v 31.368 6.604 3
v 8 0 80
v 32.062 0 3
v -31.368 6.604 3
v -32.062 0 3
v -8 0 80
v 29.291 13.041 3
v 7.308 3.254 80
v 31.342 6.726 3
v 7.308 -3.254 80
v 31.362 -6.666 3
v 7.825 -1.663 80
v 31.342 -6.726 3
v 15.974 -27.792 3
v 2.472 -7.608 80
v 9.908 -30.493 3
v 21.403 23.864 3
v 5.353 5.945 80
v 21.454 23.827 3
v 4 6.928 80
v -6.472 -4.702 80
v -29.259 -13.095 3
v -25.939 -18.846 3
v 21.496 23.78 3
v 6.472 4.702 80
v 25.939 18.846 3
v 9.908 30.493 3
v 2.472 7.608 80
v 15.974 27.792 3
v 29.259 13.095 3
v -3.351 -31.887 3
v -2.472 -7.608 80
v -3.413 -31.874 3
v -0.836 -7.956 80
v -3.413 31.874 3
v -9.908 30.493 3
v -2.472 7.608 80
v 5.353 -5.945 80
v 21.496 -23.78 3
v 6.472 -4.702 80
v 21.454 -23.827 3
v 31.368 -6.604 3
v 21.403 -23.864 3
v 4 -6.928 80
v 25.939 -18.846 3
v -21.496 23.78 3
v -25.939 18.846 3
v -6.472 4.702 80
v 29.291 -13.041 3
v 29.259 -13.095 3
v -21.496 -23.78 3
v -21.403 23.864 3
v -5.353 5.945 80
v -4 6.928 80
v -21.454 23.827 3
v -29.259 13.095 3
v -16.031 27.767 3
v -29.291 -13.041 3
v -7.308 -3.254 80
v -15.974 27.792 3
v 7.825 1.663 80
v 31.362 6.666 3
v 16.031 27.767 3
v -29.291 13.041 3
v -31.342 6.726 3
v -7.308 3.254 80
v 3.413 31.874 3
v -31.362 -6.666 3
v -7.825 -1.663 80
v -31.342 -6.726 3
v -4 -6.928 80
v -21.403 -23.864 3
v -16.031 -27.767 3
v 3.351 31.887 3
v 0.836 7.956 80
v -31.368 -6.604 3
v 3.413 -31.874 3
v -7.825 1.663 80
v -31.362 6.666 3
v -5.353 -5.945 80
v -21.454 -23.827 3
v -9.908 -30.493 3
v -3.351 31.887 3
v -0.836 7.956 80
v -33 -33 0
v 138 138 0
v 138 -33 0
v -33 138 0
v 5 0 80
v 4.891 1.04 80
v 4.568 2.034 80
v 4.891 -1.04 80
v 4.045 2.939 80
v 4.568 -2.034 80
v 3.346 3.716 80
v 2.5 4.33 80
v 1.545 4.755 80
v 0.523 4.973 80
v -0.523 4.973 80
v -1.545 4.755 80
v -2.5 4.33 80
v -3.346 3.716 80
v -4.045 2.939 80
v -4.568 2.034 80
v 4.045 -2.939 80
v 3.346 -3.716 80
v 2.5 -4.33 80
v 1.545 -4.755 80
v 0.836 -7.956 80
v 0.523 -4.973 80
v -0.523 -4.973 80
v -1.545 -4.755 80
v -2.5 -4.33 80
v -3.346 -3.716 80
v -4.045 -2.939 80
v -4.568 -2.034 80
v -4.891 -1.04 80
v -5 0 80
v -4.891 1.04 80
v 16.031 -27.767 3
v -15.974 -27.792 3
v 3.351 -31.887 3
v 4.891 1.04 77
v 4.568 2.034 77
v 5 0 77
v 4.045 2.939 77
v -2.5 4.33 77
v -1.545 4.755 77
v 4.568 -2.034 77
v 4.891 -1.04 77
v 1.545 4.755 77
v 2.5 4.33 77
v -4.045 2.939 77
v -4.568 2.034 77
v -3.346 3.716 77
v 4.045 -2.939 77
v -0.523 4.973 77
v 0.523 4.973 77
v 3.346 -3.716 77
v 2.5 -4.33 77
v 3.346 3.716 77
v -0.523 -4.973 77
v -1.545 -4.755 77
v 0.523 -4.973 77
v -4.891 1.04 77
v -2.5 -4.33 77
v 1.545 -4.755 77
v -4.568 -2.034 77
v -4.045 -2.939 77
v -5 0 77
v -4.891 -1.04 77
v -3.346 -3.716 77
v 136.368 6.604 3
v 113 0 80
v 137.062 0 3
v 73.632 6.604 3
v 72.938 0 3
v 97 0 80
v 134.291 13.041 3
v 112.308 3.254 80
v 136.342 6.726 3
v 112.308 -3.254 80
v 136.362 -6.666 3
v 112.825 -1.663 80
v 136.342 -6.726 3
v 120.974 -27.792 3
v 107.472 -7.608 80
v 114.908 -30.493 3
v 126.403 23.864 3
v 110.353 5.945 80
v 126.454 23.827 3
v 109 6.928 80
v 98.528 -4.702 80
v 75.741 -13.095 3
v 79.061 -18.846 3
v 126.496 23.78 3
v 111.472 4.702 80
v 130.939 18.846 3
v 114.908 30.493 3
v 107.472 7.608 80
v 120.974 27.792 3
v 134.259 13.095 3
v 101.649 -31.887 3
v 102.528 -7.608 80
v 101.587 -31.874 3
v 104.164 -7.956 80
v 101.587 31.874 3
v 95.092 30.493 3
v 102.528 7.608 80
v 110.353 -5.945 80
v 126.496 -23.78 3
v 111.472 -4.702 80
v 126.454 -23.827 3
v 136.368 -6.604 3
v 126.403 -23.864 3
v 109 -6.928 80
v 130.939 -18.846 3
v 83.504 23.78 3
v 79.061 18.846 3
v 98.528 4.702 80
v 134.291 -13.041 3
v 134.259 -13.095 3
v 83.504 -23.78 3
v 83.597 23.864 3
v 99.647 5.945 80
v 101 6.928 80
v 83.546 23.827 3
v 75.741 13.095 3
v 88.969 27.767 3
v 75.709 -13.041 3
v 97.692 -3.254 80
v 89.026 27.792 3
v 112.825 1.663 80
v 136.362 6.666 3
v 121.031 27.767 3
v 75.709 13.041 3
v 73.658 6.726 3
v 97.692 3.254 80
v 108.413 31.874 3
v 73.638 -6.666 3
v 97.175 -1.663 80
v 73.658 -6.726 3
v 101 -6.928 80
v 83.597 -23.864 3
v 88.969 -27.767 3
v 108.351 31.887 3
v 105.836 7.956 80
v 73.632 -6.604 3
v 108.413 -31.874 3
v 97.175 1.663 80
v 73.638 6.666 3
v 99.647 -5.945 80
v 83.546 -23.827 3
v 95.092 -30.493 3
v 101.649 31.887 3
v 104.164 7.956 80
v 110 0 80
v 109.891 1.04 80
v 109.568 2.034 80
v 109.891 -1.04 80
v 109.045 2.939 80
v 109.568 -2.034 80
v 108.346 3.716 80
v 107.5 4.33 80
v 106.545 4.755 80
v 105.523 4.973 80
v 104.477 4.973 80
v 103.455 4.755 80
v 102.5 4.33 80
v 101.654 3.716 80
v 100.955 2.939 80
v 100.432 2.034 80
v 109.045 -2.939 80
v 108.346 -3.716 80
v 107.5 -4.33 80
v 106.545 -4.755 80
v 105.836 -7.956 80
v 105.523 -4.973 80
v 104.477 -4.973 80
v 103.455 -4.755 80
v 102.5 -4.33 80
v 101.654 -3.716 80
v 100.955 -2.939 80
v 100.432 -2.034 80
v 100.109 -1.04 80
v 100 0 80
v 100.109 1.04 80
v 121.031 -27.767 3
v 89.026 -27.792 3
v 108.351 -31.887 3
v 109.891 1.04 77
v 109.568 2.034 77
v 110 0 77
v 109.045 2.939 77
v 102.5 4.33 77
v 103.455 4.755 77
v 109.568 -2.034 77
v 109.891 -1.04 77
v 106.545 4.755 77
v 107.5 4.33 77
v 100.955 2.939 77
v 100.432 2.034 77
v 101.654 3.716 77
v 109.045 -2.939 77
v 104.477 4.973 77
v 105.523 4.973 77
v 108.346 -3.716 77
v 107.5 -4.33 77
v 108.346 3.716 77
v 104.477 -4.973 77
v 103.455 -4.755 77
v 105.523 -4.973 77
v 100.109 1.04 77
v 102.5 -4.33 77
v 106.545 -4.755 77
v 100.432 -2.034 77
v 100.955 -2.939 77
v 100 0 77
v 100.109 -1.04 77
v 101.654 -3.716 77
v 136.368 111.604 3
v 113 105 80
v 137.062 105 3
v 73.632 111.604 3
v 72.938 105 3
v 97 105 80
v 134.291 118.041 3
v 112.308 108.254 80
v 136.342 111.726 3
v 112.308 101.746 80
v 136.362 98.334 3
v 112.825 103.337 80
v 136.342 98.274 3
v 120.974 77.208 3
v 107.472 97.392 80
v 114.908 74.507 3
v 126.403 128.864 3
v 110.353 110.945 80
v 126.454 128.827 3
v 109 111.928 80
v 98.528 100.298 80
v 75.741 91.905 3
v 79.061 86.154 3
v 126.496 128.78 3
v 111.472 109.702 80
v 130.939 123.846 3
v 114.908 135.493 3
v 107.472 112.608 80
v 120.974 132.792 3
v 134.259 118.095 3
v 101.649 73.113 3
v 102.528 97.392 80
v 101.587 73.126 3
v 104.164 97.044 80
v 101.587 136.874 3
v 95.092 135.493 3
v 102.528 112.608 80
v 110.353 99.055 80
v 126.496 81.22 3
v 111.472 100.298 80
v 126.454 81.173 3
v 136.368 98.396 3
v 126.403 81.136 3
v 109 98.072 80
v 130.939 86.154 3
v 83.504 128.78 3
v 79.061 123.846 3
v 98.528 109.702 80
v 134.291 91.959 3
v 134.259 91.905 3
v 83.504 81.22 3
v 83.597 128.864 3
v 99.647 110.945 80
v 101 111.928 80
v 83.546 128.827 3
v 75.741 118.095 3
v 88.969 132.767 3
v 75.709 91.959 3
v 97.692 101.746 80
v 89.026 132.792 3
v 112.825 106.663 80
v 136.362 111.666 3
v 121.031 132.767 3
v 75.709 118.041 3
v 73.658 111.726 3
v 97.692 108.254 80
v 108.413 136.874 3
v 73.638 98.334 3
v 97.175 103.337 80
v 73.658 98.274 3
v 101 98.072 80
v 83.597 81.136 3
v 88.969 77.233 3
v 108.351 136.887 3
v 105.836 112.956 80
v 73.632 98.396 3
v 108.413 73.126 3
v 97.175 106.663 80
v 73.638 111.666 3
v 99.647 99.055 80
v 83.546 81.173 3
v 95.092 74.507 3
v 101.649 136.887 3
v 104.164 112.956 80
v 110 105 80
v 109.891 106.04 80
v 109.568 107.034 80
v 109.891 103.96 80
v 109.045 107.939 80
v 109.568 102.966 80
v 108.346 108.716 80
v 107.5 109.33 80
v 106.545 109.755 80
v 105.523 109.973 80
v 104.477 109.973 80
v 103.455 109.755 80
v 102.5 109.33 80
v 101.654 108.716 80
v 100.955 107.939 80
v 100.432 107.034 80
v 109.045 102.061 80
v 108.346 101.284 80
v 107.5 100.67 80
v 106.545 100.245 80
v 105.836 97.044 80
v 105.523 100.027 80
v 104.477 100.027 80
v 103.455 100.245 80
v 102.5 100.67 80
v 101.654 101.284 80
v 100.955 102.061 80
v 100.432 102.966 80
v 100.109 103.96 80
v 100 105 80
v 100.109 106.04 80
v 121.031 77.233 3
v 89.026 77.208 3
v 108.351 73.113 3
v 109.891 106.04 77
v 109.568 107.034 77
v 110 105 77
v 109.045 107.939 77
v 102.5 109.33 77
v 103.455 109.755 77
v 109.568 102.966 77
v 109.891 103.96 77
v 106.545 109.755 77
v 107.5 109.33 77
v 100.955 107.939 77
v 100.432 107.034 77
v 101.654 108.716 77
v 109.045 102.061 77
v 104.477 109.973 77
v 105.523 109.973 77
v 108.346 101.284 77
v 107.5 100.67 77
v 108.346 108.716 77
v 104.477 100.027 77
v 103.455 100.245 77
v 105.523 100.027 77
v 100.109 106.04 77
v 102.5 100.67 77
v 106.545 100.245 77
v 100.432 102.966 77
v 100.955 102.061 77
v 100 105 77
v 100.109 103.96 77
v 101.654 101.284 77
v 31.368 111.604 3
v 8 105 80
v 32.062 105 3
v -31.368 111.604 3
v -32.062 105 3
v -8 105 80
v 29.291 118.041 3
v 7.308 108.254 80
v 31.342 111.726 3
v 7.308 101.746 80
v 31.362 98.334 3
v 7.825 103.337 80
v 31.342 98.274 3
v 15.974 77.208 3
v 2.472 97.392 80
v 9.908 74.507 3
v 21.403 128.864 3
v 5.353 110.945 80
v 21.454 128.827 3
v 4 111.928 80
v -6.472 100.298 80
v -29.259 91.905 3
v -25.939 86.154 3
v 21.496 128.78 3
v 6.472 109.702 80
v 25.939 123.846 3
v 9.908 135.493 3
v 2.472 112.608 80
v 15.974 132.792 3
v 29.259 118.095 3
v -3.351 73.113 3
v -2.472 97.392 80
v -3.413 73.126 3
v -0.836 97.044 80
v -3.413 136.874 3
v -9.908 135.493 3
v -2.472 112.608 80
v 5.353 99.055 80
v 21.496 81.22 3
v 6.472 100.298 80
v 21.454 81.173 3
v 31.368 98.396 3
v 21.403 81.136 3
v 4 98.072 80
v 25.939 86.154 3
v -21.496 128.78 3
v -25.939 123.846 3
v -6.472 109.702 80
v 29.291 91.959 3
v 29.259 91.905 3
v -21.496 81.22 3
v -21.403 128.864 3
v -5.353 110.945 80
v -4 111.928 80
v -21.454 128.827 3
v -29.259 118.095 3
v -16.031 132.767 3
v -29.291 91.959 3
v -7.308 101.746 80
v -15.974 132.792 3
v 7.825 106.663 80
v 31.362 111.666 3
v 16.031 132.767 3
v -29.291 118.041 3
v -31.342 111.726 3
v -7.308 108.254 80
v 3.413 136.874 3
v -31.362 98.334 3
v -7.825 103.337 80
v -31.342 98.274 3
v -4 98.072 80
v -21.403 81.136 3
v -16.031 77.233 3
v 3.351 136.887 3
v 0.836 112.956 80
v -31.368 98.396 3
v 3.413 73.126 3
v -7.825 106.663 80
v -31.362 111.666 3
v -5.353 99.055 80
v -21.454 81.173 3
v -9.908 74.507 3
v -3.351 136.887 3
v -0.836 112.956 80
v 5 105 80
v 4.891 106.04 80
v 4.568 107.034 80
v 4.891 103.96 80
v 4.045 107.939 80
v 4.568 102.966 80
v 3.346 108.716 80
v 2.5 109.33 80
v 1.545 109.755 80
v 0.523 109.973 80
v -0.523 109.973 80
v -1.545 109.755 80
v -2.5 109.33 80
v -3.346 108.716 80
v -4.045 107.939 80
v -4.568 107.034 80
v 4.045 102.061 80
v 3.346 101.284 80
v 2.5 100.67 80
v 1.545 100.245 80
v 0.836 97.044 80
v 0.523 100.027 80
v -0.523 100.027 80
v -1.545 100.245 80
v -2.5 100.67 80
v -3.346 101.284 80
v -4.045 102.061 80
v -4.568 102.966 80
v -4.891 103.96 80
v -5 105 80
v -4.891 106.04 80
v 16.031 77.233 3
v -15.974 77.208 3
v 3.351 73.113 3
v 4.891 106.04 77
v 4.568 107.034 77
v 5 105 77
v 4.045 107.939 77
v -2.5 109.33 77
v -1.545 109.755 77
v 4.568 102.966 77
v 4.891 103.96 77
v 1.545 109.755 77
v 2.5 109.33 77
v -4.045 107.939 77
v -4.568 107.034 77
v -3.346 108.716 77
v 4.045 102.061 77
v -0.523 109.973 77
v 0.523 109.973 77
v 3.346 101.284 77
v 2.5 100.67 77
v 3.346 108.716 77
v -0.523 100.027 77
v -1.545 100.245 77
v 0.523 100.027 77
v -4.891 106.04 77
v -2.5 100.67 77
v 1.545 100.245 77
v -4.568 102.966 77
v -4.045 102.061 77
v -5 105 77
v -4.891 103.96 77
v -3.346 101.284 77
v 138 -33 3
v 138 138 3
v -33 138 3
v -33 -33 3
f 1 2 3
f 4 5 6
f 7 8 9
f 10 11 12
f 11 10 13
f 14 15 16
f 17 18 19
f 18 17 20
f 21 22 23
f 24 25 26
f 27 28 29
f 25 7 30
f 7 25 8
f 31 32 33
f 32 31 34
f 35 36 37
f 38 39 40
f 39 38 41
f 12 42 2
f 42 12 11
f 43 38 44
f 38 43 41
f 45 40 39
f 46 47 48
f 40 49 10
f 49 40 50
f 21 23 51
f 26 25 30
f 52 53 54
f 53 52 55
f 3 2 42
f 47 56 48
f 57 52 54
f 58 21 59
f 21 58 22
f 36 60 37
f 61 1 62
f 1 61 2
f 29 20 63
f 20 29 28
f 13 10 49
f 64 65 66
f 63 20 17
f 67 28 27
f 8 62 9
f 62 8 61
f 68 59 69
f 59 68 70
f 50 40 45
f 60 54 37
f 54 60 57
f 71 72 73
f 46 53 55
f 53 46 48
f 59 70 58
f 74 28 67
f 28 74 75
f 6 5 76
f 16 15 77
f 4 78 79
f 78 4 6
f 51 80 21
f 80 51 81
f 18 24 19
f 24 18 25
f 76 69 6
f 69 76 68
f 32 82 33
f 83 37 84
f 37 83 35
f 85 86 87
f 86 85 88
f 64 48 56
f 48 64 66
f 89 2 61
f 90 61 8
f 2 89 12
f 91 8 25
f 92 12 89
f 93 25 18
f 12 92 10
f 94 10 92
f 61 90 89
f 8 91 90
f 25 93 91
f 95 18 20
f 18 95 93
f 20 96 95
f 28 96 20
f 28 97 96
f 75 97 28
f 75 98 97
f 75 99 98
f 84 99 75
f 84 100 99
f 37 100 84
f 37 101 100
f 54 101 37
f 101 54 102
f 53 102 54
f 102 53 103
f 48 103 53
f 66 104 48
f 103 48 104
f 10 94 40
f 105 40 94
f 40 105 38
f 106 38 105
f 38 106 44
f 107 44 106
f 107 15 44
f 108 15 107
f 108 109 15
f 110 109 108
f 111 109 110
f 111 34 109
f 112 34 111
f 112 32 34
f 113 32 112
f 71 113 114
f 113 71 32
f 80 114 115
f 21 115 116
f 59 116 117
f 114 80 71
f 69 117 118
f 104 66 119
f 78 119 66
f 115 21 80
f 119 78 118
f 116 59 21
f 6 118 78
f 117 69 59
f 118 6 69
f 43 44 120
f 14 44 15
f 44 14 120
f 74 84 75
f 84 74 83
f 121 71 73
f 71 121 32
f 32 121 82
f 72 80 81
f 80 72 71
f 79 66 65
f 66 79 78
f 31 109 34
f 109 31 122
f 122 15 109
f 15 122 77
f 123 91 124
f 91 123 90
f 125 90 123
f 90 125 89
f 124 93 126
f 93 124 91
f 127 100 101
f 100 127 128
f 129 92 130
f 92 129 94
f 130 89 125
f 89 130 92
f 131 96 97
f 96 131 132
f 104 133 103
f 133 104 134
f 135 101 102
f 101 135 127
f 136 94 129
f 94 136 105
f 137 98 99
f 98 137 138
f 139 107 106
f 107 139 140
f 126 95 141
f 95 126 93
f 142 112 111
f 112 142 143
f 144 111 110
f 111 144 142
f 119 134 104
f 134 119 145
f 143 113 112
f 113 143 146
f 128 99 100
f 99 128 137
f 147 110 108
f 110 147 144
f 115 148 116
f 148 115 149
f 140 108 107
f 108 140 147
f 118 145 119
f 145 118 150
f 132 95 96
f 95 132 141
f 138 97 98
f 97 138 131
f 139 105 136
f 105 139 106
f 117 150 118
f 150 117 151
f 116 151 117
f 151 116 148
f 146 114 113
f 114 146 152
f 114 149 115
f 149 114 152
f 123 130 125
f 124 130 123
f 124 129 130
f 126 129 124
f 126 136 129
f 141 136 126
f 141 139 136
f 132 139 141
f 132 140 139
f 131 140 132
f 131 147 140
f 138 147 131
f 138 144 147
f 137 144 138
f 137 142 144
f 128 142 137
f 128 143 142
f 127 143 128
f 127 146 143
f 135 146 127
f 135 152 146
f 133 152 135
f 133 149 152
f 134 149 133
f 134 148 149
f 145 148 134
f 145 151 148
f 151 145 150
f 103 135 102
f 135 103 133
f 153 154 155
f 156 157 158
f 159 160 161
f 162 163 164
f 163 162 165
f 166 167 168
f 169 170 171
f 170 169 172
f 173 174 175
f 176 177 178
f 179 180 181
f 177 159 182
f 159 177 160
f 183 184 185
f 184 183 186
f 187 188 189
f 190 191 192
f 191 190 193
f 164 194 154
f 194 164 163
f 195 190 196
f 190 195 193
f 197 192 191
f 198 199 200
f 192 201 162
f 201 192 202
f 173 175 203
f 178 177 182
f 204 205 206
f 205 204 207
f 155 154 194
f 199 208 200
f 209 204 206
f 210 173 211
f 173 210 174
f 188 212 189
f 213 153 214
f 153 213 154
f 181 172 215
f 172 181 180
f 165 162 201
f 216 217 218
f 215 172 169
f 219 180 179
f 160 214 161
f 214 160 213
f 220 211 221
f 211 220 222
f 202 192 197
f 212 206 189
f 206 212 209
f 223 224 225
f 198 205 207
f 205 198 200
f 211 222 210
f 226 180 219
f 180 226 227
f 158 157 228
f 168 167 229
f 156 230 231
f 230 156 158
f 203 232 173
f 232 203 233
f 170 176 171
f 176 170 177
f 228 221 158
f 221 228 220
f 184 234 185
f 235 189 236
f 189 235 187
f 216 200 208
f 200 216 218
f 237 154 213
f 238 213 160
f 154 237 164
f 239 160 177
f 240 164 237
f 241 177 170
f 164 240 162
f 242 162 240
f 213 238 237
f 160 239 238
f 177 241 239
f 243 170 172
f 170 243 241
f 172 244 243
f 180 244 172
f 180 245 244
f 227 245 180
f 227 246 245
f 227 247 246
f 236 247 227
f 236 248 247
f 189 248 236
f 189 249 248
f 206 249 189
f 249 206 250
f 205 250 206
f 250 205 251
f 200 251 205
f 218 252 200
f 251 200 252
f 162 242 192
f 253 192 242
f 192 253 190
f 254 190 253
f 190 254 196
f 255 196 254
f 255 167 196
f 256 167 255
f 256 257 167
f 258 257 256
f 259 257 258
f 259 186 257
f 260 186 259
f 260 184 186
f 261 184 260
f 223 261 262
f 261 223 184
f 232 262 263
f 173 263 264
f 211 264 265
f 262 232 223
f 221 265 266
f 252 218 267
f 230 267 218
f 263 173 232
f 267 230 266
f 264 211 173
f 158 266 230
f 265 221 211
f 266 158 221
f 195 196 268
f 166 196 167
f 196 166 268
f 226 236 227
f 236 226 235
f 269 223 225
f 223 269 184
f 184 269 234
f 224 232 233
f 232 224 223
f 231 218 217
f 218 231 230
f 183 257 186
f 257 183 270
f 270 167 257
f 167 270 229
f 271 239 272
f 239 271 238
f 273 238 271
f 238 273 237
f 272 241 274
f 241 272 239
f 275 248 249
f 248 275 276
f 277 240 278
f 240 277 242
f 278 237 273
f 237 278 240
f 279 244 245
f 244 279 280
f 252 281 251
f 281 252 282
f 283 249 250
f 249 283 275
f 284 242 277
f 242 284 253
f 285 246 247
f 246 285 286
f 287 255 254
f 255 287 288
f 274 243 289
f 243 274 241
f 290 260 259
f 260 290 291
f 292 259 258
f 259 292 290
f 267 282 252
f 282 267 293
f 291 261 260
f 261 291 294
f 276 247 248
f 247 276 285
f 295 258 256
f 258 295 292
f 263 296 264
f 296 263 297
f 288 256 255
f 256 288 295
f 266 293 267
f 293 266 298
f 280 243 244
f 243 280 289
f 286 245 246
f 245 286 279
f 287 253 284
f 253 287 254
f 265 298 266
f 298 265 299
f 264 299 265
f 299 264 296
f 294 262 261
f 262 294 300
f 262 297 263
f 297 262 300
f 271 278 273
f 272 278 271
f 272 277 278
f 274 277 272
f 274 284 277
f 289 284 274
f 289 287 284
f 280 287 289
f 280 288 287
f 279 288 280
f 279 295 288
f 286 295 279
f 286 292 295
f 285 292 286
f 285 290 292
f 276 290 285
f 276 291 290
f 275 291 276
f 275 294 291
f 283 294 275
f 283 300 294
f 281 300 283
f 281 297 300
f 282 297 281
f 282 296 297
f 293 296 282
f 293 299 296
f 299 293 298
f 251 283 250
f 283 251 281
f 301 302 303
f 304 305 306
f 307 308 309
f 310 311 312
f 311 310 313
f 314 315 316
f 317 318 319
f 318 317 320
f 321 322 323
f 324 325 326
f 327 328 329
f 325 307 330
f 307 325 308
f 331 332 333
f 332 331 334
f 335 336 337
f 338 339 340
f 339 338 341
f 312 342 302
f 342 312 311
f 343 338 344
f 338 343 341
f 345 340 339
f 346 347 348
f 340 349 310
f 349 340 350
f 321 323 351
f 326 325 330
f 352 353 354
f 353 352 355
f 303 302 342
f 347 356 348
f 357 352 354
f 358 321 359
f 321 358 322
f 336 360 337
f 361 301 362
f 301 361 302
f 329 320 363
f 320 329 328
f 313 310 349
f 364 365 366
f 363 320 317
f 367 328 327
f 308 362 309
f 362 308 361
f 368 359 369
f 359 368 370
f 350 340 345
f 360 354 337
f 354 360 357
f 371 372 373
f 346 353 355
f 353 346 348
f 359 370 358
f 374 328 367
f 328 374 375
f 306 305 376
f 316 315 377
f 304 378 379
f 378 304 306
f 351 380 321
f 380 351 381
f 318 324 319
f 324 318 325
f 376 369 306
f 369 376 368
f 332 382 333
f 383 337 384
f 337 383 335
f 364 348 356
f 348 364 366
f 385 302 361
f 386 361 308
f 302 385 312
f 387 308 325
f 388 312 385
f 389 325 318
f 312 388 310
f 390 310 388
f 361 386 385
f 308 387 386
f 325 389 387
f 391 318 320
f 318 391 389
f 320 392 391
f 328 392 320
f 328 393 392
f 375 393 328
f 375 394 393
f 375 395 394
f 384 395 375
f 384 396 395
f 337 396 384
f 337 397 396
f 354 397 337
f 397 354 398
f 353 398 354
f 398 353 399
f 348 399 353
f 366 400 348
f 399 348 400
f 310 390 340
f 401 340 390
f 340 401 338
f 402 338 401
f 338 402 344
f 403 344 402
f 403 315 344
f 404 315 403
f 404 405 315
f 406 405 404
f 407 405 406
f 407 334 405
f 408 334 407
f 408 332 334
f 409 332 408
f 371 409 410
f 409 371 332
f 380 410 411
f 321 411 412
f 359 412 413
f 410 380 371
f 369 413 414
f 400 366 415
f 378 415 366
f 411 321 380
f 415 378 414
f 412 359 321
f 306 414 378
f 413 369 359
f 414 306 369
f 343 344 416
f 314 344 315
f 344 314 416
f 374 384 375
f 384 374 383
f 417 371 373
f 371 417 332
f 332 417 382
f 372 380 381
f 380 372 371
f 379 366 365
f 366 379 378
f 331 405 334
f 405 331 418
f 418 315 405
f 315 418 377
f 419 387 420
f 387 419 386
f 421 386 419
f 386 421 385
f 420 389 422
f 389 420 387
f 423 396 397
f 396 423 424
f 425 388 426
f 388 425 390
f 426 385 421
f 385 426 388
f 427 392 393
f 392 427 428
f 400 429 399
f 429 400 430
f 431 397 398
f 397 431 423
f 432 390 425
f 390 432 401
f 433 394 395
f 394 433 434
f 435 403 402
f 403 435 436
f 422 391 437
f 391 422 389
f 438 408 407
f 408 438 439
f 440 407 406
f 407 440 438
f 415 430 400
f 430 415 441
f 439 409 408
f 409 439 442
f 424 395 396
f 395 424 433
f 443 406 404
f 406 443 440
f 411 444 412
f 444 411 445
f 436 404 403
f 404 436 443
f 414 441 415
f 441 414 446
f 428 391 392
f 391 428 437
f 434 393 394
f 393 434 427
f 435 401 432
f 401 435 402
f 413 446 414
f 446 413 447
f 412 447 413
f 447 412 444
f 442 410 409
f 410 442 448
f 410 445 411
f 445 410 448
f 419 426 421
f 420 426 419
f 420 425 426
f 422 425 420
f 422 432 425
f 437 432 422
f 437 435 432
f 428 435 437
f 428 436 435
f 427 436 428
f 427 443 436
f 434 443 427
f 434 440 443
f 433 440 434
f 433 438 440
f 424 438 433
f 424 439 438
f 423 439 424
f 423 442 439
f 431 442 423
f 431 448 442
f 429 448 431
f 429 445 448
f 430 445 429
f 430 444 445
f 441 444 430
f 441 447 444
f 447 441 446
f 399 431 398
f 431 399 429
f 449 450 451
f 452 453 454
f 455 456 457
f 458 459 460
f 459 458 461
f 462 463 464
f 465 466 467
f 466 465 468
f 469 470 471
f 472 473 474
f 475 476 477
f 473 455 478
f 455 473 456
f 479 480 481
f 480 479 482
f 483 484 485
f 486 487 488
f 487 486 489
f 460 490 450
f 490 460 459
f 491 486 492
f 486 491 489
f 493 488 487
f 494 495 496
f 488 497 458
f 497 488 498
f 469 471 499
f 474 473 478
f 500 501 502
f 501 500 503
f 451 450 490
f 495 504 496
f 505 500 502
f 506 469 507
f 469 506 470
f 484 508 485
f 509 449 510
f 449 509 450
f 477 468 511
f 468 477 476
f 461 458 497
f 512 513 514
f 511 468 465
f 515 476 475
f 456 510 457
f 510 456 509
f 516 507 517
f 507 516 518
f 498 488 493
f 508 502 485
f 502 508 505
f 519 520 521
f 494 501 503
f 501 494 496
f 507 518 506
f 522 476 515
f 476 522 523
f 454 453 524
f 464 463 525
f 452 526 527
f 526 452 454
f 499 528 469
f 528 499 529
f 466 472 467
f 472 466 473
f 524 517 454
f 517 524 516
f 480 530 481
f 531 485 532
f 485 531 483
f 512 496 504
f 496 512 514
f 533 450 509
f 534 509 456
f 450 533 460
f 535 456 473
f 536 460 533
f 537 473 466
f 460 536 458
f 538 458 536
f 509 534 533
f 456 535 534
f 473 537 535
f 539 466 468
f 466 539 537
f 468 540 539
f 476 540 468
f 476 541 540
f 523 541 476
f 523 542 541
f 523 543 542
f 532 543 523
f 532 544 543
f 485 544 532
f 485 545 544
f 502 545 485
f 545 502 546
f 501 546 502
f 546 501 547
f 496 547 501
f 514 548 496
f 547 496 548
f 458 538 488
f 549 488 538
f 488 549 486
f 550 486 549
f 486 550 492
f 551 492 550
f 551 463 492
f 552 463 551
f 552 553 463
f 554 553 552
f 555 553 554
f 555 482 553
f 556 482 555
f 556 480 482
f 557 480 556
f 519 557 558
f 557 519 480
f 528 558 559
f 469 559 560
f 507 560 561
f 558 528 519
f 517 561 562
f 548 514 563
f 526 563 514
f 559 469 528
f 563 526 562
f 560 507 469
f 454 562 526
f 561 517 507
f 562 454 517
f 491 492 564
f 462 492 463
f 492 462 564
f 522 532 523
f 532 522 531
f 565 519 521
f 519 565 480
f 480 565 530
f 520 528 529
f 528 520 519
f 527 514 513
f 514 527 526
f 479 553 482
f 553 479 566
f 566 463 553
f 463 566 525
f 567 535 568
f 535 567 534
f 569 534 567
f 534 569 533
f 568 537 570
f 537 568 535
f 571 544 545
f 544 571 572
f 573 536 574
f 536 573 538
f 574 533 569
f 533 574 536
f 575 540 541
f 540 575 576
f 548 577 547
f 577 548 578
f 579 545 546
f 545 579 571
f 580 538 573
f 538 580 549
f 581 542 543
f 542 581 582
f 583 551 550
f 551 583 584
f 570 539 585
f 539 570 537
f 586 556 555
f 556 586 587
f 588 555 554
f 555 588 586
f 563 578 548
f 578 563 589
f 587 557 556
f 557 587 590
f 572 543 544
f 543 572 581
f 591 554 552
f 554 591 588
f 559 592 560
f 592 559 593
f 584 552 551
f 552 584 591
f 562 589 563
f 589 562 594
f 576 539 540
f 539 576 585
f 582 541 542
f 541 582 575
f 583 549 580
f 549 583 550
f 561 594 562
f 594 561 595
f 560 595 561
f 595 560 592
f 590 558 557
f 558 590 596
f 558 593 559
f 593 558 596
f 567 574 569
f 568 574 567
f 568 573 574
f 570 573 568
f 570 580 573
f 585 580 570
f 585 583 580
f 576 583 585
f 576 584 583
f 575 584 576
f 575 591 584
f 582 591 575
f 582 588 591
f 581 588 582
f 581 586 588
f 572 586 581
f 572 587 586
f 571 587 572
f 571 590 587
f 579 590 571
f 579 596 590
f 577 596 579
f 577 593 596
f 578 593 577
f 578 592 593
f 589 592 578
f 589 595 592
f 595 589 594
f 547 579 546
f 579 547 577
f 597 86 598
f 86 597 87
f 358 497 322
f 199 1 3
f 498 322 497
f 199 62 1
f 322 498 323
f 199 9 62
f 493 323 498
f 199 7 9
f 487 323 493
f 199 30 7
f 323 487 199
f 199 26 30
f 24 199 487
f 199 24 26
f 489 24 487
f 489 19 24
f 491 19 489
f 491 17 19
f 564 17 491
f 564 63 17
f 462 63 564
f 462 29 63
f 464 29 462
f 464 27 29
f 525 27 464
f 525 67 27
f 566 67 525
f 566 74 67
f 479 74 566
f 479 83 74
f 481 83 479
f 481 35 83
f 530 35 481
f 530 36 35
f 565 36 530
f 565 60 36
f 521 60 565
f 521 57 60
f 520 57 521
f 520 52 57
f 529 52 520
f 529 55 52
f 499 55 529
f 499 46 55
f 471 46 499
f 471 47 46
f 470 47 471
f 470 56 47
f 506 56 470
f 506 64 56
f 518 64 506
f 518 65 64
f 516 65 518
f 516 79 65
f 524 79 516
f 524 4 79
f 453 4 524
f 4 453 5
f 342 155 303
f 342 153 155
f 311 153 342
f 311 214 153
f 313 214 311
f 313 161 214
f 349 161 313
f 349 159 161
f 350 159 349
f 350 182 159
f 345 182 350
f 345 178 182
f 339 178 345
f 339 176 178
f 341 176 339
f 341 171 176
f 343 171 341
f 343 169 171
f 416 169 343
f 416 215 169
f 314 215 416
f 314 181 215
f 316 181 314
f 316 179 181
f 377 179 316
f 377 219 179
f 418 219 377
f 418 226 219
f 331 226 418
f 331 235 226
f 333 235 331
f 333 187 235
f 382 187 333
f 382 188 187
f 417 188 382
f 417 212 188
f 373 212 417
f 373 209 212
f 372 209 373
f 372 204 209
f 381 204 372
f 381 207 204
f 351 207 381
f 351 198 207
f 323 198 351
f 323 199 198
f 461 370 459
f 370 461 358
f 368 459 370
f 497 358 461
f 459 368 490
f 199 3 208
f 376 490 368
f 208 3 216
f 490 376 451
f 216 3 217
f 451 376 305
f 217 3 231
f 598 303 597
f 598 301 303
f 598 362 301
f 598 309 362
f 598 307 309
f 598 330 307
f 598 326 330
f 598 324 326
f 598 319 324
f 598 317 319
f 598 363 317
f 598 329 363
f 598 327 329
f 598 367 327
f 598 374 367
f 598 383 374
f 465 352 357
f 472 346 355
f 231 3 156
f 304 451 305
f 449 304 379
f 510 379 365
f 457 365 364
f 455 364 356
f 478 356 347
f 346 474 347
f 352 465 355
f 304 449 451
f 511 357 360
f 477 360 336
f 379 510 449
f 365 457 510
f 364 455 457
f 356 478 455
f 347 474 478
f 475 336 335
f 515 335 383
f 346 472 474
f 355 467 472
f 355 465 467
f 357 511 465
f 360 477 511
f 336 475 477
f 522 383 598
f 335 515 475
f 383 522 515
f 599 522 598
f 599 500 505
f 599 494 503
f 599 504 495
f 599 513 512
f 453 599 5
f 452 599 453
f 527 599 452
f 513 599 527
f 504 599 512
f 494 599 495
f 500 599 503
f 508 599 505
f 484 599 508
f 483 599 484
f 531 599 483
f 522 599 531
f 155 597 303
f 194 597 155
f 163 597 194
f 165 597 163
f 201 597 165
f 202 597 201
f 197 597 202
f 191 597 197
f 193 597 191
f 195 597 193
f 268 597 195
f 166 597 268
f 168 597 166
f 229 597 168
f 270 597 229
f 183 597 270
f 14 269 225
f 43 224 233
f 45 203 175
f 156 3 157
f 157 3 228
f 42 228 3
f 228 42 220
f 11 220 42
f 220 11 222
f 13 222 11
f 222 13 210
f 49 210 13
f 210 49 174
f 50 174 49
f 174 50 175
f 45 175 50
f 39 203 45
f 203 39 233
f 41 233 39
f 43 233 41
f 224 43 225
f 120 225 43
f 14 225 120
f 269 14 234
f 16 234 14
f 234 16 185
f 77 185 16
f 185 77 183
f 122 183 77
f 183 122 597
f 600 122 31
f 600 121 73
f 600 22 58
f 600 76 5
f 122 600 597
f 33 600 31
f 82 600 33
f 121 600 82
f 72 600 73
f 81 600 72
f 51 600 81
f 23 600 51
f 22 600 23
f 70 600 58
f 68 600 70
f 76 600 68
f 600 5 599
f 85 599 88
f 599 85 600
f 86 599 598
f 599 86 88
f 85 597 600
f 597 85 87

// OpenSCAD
// Stand for bubble magus curve 5.
// Created by Sean Esopenko.
// Licensed GNU GPL V3.  License should be included in package as LICENSE.txt

// Targets

targetHeight = 80;

// Measurements

footDistance = 105;
footWidth = 10;



// Design Parameters

bottomPlateThickness = 3;
cupHeight = 3;

cylinderExtension = 3;
columnRadiusTop = footWidth / 2 + cylinderExtension;
columnRadiusBottom = columnRadiusTop + 25;

plateWidth = footDistance + (columnRadiusBottom * 2);

module bottomPlate() {
    cube([plateWidth, plateWidth, bottomPlateThickness]);
}

module column() {
    difference() {
        cylinder(h = targetHeight, r1 = columnRadiusBottom, r2 = columnRadiusTop, $fn = 30);
        translate([0, 0, targetHeight - cupHeight]) {
            footCup();
        }
        
    }
    
}

module footCup() {
    cupRadius = footWidth / 2;
    
    cylinder(h = cupHeight, r1 = cupRadius, r2 = cupRadius, $fn = 30);
}

module columnSet() {
    column();
    translate([footDistance, 0, 0]) {
        column();
    }
    translate([footDistance, footDistance, 0]) {
        column();
    }
    translate([0, footDistance, 0]) {
        column();
    }
    translate([footDistance, 0, 0]) {
        column();
    }
}

module stand() {
    union() {
        columnSet();
        translate([-columnRadiusBottom, -columnRadiusBottom, 0]) {
            bottomPlate();
        }
        
    }
}


stand();
